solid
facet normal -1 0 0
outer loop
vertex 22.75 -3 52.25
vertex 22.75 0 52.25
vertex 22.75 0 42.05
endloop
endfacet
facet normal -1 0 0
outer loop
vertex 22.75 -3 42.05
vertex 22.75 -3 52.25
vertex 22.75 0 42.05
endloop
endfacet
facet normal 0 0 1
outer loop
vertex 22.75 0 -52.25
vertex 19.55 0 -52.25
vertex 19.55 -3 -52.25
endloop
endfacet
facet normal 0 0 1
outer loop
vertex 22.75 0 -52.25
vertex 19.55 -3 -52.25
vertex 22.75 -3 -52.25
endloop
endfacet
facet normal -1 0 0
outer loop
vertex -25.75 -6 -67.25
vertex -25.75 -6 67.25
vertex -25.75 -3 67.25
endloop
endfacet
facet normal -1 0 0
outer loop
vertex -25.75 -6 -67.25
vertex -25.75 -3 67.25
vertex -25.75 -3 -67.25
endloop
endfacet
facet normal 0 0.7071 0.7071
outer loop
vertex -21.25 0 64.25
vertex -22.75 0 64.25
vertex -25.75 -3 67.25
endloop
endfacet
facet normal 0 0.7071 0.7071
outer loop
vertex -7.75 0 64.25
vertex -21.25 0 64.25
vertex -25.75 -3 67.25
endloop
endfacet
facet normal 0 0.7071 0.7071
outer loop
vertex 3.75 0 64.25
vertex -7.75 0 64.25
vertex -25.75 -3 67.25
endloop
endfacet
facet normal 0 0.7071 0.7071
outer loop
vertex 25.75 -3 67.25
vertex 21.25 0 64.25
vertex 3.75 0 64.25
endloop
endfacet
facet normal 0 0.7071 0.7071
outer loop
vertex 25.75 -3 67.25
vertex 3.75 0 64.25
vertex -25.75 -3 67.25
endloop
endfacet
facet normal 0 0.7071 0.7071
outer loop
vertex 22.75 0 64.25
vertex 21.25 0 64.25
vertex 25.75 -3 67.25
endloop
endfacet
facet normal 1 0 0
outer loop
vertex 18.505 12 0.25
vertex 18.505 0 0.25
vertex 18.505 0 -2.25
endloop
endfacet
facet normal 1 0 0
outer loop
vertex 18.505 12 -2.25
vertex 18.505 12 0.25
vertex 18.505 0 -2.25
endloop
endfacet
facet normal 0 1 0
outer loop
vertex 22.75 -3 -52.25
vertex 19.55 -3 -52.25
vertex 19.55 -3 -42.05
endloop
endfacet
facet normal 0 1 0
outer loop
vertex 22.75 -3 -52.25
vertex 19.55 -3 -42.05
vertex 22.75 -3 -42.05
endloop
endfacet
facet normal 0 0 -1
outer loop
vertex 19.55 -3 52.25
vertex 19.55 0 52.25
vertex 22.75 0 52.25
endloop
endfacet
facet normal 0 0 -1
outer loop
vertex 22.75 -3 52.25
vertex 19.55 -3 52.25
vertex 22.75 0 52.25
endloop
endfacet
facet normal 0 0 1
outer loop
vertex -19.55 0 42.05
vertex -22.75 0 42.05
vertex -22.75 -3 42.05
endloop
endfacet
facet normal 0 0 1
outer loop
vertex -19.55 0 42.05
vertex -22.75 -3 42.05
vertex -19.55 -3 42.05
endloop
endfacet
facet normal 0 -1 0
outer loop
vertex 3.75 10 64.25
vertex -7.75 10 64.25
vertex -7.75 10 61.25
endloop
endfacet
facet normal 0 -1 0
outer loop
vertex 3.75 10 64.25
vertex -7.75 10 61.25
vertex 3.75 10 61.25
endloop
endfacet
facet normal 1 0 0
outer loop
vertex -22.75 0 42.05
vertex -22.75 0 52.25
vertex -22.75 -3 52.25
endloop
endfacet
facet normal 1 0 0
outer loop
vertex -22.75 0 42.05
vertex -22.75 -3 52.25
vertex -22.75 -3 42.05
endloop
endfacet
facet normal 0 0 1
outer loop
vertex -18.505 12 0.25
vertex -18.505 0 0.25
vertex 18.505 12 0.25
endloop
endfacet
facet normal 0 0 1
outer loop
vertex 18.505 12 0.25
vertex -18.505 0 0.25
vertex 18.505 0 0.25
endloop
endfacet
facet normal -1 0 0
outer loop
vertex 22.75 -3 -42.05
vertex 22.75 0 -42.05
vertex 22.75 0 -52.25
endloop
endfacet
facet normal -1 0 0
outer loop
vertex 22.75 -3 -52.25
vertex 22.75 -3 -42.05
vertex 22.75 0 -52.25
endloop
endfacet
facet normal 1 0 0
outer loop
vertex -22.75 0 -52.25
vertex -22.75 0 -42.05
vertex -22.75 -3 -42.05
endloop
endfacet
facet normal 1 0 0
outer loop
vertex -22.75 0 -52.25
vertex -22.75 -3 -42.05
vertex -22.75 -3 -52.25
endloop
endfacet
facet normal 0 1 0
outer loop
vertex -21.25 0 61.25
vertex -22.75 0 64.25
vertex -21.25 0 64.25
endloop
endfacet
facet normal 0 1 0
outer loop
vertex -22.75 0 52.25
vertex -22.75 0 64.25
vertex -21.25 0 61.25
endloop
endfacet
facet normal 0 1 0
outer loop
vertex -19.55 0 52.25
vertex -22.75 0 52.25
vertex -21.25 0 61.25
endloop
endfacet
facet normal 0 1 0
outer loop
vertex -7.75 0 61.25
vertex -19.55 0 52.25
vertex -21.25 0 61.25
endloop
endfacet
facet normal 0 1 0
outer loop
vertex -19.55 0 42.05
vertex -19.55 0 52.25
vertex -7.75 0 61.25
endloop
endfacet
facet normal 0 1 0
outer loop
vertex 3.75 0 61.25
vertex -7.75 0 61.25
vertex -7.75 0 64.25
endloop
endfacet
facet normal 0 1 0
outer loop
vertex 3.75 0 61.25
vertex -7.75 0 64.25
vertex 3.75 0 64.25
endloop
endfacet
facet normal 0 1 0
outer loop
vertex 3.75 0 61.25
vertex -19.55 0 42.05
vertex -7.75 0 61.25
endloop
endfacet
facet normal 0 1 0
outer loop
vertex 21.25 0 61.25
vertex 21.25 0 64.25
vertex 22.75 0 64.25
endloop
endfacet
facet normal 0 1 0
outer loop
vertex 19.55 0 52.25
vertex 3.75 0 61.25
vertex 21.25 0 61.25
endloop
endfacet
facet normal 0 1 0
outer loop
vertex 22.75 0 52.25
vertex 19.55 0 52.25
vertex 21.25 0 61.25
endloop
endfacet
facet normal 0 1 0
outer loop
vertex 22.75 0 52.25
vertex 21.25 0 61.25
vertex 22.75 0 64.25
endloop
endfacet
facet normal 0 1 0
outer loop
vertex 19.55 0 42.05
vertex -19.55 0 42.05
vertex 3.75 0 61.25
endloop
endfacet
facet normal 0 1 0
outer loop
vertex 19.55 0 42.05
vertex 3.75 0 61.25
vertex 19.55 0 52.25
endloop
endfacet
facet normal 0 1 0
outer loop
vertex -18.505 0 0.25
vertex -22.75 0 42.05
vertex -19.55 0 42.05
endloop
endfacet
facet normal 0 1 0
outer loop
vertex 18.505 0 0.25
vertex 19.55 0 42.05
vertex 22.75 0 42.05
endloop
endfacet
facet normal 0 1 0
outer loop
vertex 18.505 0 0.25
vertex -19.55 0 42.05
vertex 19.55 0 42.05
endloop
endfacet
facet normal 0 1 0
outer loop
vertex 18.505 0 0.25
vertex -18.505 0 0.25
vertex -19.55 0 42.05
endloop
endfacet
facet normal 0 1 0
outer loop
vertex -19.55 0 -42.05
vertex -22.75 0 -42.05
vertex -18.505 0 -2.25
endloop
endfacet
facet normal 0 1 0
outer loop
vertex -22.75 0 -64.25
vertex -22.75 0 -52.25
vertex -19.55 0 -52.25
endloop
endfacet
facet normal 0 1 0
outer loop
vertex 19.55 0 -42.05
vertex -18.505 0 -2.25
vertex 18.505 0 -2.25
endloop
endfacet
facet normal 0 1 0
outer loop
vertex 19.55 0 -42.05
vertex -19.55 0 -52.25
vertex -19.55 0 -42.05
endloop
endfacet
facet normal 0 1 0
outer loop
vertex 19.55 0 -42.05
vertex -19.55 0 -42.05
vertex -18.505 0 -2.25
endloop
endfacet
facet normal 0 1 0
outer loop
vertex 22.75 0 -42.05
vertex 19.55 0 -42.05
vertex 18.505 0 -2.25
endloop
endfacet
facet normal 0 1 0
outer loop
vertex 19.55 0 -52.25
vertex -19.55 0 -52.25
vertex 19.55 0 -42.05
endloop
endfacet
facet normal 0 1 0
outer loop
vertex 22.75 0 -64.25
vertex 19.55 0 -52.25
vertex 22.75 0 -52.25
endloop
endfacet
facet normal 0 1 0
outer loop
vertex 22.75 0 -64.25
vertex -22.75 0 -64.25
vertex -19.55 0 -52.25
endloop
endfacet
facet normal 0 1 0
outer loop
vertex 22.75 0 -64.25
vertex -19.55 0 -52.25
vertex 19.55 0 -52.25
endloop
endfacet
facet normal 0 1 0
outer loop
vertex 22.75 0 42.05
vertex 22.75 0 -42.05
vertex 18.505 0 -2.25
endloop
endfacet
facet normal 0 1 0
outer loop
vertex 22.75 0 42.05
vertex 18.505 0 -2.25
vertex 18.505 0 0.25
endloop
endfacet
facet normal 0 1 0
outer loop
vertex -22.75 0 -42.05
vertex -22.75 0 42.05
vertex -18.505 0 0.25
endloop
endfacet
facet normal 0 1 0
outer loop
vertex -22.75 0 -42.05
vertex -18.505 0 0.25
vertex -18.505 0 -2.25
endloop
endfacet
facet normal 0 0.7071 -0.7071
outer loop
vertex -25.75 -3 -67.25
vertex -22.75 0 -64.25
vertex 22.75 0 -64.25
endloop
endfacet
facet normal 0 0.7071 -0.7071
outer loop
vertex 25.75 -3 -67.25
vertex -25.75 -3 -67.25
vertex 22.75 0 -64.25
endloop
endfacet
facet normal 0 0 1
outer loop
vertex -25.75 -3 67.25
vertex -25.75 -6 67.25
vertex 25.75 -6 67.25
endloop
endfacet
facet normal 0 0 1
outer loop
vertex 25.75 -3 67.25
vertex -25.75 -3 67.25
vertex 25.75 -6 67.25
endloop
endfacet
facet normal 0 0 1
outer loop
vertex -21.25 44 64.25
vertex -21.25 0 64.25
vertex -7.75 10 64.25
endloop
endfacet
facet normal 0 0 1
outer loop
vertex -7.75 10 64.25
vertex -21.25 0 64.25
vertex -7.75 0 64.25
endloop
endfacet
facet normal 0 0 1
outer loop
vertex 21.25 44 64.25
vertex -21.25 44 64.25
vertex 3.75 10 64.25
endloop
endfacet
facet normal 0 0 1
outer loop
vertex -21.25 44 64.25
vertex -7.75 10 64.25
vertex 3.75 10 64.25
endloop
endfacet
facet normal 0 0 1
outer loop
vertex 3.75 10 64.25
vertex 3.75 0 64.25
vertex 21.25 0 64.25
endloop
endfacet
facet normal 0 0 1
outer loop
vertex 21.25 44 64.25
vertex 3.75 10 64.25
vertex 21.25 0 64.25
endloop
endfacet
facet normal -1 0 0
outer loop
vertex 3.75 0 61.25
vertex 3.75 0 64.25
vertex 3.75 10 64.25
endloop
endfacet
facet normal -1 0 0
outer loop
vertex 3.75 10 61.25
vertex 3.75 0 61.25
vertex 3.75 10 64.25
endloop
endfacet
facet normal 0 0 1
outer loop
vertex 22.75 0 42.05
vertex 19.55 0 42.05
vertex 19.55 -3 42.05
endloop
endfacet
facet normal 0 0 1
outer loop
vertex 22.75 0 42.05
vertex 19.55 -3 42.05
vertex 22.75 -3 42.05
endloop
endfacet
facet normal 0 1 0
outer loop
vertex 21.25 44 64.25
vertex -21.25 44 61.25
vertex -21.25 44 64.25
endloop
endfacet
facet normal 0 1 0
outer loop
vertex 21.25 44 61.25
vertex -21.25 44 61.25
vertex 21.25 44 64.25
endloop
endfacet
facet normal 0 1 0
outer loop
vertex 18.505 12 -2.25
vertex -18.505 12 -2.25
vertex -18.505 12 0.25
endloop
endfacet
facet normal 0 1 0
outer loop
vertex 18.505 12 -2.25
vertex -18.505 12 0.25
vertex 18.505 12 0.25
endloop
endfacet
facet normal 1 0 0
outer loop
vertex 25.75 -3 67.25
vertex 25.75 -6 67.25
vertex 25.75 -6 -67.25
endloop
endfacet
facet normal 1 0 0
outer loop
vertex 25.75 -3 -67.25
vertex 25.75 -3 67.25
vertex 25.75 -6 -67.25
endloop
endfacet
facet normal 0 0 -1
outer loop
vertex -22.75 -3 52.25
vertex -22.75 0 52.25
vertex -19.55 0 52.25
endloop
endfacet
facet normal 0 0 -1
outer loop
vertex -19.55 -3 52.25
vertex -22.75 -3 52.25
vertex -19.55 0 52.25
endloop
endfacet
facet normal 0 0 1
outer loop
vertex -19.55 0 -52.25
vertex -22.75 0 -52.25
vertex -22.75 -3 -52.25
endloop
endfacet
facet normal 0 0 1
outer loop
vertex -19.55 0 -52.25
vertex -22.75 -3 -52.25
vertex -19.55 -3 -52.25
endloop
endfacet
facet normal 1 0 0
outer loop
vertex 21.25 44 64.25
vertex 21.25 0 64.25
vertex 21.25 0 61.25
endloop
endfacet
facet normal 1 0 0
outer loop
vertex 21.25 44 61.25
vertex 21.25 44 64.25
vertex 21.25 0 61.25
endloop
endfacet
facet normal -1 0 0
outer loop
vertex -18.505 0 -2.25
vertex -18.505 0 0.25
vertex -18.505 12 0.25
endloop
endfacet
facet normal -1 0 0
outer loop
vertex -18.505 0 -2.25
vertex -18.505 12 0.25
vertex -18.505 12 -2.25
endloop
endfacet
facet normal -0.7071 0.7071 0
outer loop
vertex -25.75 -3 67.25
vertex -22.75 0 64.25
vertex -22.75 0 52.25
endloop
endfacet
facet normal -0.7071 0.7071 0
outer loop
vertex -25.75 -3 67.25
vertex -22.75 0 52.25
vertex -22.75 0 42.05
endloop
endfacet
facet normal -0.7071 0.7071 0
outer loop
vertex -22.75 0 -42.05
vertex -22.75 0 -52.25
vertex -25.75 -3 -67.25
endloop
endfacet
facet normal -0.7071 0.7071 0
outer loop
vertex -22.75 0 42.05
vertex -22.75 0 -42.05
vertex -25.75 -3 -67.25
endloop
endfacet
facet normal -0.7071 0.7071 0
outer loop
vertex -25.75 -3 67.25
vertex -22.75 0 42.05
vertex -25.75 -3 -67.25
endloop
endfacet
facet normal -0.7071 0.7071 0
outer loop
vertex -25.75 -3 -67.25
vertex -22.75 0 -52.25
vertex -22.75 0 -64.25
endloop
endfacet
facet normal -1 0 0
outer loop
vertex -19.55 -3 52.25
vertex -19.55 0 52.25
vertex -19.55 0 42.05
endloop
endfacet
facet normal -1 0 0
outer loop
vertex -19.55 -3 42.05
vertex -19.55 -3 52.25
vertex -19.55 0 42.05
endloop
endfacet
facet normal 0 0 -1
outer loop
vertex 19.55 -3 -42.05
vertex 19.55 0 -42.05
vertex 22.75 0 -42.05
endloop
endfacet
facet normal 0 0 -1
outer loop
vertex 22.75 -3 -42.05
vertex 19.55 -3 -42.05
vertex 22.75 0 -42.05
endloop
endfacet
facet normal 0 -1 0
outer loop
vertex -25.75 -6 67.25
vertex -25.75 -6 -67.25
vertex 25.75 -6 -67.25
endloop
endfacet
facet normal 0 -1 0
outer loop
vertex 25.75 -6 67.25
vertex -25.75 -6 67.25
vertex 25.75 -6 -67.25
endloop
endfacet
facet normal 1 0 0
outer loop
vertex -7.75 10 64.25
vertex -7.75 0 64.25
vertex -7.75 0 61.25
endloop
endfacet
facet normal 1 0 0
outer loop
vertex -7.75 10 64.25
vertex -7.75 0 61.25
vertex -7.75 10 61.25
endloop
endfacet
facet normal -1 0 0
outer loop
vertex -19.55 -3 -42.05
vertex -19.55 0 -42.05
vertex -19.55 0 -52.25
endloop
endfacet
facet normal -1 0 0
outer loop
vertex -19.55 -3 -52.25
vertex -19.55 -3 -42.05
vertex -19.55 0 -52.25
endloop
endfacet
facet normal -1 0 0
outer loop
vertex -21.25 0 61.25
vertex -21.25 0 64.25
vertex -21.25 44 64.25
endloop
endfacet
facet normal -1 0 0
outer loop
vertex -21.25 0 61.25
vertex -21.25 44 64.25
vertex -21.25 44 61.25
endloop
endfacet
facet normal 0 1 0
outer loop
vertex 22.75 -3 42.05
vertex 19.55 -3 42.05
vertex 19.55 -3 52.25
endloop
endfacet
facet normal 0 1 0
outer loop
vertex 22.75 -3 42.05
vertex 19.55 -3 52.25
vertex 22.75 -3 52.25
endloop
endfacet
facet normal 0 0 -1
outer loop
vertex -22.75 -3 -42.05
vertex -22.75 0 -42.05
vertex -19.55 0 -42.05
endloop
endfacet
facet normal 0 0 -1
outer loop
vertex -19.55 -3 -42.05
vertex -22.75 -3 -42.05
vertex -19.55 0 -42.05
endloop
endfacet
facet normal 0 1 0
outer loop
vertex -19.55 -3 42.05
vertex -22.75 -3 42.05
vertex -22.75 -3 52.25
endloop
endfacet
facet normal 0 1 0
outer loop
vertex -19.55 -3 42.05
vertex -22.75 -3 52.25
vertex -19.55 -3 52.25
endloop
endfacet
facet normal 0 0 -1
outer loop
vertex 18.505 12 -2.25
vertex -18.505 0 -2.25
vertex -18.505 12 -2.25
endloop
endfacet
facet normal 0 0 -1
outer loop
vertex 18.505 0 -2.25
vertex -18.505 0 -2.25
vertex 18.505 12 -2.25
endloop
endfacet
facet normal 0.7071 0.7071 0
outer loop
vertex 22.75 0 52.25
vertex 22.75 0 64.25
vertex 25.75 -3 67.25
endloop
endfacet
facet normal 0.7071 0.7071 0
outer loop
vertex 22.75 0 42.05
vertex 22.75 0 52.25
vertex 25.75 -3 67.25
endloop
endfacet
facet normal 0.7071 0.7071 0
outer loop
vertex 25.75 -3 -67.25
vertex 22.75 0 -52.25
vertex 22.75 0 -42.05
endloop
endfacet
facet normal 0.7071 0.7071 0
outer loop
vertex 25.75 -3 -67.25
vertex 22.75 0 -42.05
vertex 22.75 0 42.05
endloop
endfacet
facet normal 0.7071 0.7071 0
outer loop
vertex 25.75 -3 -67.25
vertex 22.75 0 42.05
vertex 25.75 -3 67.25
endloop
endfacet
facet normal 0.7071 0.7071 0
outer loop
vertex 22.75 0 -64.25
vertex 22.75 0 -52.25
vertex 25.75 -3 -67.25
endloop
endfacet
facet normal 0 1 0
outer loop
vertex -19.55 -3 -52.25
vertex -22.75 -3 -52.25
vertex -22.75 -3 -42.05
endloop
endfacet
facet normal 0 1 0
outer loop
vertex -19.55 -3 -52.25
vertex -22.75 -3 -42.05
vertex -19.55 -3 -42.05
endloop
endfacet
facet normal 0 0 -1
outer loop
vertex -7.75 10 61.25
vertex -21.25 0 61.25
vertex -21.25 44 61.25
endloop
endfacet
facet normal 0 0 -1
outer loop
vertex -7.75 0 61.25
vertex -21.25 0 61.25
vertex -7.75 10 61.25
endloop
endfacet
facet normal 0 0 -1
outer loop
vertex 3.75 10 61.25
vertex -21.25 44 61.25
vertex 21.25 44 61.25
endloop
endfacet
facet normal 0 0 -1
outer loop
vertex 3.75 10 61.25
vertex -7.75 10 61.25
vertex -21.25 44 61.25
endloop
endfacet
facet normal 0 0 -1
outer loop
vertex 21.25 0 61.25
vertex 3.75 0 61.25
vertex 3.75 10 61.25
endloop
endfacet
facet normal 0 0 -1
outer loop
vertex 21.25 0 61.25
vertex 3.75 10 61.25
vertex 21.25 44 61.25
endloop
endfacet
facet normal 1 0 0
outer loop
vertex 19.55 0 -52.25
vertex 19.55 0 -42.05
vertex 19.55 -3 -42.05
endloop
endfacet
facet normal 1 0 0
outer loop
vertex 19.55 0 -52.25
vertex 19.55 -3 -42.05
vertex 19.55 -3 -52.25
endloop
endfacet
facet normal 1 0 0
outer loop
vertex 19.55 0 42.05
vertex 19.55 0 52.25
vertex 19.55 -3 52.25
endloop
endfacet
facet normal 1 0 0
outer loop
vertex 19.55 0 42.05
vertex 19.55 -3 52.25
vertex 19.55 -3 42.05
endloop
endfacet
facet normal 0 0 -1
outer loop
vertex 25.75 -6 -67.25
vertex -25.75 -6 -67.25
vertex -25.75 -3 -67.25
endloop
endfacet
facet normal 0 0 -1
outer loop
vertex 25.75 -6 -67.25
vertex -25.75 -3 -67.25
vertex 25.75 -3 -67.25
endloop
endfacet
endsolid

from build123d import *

# Parameters (mm, degrees)
LOFT1_OUTLINE_W     = 45.5
LOFT1_OUTLINE_H     = 128.5
LOFT1_DEPTH         = 3
LOFT1_DRAFT         = 45
LOFT2_START         = -6
LOFT2_OUTLINE_W     = 51.5
LOFT2_OUTLINE_H     = 134.5
LOFT2_DEPTH         = 3
SKETCH4_W           = 42.5
SKETCH4_H           = 3
BOSS_EXTRUDE1_DEPTH = 44
SKETCH5_W           = 11.5
SKETCH5_H           = 10
CUT_EXTRUDE1_DEPTH  = 45.5
SKETCH6_W           = 37.00940911
SKETCH6_H           = 2.5
BOSS_EXTRUDE2_DEPTH = 12
SKETCH7_W           = 3.2
SKETCH7_H           = 10.2
CUT_EXTRUDE2_DEPTH  = 3


# Read off the part's stored shape, not the designer's step: Loft1, Loft2
with BuildPart() as part:
    # Loft1 outline → Loft1 (with draft: the straight prism first)
    with BuildSketch(Plane(origin=(0, 0, 0), x_dir=(1, 0, 0), z_dir=(0, 1, 0))):
        Rectangle(LOFT1_OUTLINE_W, LOFT1_OUTLINE_H)
    extrude(amount=-LOFT1_DEPTH)
    # Loft1: the draft: its side faces are tilted about the plane it starts from
    loft1_sides = [part.faces().sort_by_distance(p)[0] for p in [
        (22.75, -1.5, 0),
        (0, -1.5, -64.25),
        (-22.75, -1.5, 0),
        (0, -1.5, 64.25),
    ]]
    draft(loft1_sides, Plane(origin=(0, 0, 0), x_dir=(1, 0, 0), z_dir=(0, 1, 0)), LOFT1_DRAFT)

    # Loft2 outline → Loft2 (add)
    with BuildSketch(Plane(origin=(0, 0, 0), x_dir=(1, 0, 0), z_dir=(0, 1, 0)).offset(LOFT2_START)):
        Rectangle(LOFT2_OUTLINE_W, LOFT2_OUTLINE_H)
    extrude(amount=LOFT2_DEPTH)

    # Sketch4 → Boss-Extrude1 (add)
    with BuildSketch(Plane(origin=(0, 0, 0), x_dir=(1, 0, 0), z_dir=(0, 1, 0))):
        with Locations((0, -62.75)):
            Rectangle(SKETCH4_W, SKETCH4_H)
    extrude(amount=BOSS_EXTRUDE1_DEPTH)

    # Sketch5 → Cut-Extrude1 (cut)
    with BuildSketch(Plane.XY.offset(64.25)):
        with Locations((-2, 5)):
            Rectangle(SKETCH5_W, SKETCH5_H)
    extrude(amount=-CUT_EXTRUDE1_DEPTH, mode=Mode.SUBTRACT)

    # Sketch6 → Boss-Extrude2 (add)
    with BuildSketch(Plane(origin=(0, 0, 0), x_dir=(1, 0, 0), z_dir=(0, 1, 0))):
        with Locations((0, 1)):
            Rectangle(SKETCH6_W, SKETCH6_H)
    extrude(amount=BOSS_EXTRUDE2_DEPTH)

    # Sketch7 → Cut-Extrude2 (cut)
    with BuildSketch(Plane(origin=(0, 0, 0), x_dir=(1, 0, 0), z_dir=(0, 1, 0))):
        with Locations((-21.15, 47.15)):
            Rectangle(SKETCH7_W, SKETCH7_H)
        with Locations((21.15, 47.15)):
            Rectangle(SKETCH7_W, SKETCH7_H)
        with Locations((-21.15, -47.15)):
            Rectangle(SKETCH7_W, SKETCH7_H)
        with Locations((21.15, -47.15)):
            Rectangle(SKETCH7_W, SKETCH7_H)
    extrude(amount=-CUT_EXTRUDE2_DEPTH, mode=Mode.SUBTRACT)


solid = part.part
